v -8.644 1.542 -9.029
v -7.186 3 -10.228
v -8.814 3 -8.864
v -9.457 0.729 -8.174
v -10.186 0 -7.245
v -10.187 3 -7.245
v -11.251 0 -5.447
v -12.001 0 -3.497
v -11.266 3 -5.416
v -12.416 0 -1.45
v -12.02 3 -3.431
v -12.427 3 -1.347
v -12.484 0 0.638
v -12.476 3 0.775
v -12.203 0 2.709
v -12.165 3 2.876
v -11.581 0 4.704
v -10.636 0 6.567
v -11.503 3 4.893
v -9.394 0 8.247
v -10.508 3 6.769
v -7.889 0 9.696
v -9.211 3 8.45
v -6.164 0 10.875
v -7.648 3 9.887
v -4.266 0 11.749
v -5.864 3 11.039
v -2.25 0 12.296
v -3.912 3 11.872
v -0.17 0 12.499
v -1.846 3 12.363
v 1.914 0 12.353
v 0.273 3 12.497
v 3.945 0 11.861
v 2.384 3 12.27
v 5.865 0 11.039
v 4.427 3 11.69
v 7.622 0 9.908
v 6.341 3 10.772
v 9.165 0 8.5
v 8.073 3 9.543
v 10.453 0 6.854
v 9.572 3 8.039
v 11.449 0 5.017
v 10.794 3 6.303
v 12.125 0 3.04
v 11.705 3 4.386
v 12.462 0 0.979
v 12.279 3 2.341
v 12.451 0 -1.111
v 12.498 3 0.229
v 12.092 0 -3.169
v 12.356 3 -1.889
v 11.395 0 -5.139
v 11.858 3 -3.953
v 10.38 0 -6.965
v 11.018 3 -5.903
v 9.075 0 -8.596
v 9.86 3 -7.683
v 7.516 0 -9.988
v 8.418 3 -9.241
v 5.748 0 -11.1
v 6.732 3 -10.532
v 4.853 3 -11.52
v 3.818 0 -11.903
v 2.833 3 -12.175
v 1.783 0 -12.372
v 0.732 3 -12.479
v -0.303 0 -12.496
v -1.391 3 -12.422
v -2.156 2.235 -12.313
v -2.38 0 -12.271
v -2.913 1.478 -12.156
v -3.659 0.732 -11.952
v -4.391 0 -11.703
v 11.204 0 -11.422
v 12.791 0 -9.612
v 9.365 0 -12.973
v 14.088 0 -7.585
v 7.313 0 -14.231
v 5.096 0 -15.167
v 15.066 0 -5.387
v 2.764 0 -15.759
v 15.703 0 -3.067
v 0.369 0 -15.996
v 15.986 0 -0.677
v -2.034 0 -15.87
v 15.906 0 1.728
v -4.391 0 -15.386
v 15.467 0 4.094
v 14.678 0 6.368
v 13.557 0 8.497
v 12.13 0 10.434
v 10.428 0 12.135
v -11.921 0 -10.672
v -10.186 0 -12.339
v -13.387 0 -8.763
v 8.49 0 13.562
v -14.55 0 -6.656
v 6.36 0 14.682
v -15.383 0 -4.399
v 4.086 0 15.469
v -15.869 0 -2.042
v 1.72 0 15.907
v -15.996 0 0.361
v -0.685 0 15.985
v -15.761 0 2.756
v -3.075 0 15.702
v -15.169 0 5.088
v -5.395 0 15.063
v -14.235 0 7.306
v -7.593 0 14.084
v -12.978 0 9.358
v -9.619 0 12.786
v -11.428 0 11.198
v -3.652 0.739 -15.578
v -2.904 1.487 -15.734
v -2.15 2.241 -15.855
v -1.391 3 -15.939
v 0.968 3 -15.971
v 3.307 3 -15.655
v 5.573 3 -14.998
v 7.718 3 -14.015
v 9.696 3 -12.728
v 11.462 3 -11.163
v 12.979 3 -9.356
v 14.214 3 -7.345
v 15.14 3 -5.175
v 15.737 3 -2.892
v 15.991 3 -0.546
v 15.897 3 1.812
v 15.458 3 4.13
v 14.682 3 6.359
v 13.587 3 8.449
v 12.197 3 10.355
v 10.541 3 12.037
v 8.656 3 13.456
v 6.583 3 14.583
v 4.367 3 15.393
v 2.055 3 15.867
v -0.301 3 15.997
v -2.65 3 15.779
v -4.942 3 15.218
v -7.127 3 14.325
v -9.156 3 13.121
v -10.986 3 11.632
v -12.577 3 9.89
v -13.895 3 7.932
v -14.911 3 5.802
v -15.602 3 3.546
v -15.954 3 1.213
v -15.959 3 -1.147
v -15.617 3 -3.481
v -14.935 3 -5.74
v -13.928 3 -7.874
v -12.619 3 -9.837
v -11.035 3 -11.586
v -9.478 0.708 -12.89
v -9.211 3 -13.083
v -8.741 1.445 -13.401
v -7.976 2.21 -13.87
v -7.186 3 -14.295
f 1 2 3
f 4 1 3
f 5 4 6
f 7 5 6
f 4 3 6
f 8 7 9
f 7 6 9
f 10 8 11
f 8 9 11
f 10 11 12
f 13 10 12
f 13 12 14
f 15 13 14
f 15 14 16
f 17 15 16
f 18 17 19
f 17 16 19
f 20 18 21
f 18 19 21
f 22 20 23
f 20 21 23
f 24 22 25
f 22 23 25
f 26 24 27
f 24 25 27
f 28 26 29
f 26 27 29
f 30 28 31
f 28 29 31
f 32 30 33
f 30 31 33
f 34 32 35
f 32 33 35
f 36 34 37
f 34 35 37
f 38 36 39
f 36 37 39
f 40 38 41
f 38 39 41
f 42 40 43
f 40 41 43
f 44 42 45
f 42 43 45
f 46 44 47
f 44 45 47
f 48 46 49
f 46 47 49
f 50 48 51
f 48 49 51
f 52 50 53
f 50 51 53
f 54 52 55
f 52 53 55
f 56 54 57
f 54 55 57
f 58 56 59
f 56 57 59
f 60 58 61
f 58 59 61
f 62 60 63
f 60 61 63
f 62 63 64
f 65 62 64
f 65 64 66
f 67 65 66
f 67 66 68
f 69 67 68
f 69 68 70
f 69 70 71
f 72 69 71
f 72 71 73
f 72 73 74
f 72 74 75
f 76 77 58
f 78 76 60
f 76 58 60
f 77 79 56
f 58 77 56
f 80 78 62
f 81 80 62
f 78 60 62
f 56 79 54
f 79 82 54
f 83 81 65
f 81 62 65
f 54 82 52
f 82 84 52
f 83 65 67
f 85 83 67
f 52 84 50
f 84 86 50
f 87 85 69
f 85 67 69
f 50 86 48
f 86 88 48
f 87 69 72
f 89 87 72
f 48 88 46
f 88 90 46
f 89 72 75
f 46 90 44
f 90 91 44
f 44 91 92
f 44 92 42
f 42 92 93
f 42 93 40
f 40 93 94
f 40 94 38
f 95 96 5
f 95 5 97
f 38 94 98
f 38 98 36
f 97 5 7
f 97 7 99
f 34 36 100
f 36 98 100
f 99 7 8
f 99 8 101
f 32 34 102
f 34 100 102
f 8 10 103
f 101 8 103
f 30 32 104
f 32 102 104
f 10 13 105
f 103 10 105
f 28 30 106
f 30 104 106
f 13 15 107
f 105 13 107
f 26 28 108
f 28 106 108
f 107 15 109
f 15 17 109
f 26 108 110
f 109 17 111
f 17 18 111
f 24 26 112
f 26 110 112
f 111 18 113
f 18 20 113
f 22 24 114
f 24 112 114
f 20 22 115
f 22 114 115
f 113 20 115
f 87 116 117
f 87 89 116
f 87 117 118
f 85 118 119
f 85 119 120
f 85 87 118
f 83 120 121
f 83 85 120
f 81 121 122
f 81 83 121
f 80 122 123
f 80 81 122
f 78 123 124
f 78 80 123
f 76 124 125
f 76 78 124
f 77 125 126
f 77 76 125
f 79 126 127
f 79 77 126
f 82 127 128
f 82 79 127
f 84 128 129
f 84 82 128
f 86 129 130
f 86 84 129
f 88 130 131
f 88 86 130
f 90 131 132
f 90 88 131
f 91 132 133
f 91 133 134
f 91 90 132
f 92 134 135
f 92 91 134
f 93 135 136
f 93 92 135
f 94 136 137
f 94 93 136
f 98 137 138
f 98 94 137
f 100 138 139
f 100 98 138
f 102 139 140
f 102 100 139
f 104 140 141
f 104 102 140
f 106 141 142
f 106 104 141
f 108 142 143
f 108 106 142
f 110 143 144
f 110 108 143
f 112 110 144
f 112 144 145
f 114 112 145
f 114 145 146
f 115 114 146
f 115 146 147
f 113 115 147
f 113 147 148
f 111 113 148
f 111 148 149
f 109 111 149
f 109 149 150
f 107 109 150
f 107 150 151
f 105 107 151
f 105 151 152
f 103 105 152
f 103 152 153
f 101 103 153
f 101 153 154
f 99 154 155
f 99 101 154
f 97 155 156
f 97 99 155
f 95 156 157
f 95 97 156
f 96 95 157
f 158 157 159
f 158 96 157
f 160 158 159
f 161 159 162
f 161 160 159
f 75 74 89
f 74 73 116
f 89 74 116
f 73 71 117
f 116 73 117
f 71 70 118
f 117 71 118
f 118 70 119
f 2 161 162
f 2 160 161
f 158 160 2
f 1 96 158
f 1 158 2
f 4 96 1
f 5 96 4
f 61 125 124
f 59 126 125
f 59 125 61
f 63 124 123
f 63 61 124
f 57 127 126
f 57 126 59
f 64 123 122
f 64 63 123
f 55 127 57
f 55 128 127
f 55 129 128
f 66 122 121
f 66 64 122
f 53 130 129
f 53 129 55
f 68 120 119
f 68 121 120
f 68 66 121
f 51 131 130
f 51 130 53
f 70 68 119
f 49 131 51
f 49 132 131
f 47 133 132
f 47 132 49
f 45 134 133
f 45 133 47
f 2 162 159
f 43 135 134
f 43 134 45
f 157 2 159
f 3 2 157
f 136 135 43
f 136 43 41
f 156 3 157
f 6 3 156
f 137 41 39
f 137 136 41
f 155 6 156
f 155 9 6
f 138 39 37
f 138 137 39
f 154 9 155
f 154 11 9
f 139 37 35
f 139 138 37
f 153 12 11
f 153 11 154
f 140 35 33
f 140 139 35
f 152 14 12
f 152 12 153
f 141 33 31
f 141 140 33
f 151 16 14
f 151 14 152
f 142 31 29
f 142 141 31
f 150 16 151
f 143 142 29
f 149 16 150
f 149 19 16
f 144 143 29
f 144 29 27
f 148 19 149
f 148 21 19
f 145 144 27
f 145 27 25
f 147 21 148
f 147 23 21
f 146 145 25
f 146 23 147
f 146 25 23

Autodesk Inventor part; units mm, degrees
ref_plane "YZ Plane" through (0, 0, 0) normal (1, 0, 0) x (0, 1, 0)
ref_plane "XZ Plane" through (0, 0, 0) normal (0, 1, 0) x (-1, 0, 0)
ref_plane "XY Plane" through (0, 0, 0) normal (0, 0, 1) x (1, 0, 0)
sketch "Sketch1" plane through (0, 0, 0) normal (0, 1, 0) x (-1, 0, 0)
  circle A0 centre (0, 0) radius 16
  dimension "d74" = 32
extrude "Extrusion3" add sketch "Sketch1" along normal blind 3
sketch "Sketch4" plane through (0, 3, 0) normal (0, 1, 0) x (1, 0, 0)
  circle A0 centre (0, 0) radius 12.5
  line L0 (-4.3909, 10.9342) -> (-4.3909, 17.3914)
  line L1 (-4.3909, 17.3914) -> (-7.1862, 17.3914)
  line L2 (-7.1862, 17.3914) -> (-7.1862, 9.3059)
  line L3 (-7.1862, 9.3059) -> (-4.3909, 9.3059)
  line L4 (-4.3909, 9.3059) -> (-4.3909, 10.9342)
  dimension "d77" = 25
extrude "Extrusion4" cut sketch "Sketch4" against normal through all
chamfer "Chamfer3" distance 3 angle 45 1 edges at (-4.3909, 3, -13.5446)
chamfer "Chamfer4" distance 3 angle 45 1 edges at (-7.1862, 0, -12.2616)
properties part number "reverse gear piston gear"
